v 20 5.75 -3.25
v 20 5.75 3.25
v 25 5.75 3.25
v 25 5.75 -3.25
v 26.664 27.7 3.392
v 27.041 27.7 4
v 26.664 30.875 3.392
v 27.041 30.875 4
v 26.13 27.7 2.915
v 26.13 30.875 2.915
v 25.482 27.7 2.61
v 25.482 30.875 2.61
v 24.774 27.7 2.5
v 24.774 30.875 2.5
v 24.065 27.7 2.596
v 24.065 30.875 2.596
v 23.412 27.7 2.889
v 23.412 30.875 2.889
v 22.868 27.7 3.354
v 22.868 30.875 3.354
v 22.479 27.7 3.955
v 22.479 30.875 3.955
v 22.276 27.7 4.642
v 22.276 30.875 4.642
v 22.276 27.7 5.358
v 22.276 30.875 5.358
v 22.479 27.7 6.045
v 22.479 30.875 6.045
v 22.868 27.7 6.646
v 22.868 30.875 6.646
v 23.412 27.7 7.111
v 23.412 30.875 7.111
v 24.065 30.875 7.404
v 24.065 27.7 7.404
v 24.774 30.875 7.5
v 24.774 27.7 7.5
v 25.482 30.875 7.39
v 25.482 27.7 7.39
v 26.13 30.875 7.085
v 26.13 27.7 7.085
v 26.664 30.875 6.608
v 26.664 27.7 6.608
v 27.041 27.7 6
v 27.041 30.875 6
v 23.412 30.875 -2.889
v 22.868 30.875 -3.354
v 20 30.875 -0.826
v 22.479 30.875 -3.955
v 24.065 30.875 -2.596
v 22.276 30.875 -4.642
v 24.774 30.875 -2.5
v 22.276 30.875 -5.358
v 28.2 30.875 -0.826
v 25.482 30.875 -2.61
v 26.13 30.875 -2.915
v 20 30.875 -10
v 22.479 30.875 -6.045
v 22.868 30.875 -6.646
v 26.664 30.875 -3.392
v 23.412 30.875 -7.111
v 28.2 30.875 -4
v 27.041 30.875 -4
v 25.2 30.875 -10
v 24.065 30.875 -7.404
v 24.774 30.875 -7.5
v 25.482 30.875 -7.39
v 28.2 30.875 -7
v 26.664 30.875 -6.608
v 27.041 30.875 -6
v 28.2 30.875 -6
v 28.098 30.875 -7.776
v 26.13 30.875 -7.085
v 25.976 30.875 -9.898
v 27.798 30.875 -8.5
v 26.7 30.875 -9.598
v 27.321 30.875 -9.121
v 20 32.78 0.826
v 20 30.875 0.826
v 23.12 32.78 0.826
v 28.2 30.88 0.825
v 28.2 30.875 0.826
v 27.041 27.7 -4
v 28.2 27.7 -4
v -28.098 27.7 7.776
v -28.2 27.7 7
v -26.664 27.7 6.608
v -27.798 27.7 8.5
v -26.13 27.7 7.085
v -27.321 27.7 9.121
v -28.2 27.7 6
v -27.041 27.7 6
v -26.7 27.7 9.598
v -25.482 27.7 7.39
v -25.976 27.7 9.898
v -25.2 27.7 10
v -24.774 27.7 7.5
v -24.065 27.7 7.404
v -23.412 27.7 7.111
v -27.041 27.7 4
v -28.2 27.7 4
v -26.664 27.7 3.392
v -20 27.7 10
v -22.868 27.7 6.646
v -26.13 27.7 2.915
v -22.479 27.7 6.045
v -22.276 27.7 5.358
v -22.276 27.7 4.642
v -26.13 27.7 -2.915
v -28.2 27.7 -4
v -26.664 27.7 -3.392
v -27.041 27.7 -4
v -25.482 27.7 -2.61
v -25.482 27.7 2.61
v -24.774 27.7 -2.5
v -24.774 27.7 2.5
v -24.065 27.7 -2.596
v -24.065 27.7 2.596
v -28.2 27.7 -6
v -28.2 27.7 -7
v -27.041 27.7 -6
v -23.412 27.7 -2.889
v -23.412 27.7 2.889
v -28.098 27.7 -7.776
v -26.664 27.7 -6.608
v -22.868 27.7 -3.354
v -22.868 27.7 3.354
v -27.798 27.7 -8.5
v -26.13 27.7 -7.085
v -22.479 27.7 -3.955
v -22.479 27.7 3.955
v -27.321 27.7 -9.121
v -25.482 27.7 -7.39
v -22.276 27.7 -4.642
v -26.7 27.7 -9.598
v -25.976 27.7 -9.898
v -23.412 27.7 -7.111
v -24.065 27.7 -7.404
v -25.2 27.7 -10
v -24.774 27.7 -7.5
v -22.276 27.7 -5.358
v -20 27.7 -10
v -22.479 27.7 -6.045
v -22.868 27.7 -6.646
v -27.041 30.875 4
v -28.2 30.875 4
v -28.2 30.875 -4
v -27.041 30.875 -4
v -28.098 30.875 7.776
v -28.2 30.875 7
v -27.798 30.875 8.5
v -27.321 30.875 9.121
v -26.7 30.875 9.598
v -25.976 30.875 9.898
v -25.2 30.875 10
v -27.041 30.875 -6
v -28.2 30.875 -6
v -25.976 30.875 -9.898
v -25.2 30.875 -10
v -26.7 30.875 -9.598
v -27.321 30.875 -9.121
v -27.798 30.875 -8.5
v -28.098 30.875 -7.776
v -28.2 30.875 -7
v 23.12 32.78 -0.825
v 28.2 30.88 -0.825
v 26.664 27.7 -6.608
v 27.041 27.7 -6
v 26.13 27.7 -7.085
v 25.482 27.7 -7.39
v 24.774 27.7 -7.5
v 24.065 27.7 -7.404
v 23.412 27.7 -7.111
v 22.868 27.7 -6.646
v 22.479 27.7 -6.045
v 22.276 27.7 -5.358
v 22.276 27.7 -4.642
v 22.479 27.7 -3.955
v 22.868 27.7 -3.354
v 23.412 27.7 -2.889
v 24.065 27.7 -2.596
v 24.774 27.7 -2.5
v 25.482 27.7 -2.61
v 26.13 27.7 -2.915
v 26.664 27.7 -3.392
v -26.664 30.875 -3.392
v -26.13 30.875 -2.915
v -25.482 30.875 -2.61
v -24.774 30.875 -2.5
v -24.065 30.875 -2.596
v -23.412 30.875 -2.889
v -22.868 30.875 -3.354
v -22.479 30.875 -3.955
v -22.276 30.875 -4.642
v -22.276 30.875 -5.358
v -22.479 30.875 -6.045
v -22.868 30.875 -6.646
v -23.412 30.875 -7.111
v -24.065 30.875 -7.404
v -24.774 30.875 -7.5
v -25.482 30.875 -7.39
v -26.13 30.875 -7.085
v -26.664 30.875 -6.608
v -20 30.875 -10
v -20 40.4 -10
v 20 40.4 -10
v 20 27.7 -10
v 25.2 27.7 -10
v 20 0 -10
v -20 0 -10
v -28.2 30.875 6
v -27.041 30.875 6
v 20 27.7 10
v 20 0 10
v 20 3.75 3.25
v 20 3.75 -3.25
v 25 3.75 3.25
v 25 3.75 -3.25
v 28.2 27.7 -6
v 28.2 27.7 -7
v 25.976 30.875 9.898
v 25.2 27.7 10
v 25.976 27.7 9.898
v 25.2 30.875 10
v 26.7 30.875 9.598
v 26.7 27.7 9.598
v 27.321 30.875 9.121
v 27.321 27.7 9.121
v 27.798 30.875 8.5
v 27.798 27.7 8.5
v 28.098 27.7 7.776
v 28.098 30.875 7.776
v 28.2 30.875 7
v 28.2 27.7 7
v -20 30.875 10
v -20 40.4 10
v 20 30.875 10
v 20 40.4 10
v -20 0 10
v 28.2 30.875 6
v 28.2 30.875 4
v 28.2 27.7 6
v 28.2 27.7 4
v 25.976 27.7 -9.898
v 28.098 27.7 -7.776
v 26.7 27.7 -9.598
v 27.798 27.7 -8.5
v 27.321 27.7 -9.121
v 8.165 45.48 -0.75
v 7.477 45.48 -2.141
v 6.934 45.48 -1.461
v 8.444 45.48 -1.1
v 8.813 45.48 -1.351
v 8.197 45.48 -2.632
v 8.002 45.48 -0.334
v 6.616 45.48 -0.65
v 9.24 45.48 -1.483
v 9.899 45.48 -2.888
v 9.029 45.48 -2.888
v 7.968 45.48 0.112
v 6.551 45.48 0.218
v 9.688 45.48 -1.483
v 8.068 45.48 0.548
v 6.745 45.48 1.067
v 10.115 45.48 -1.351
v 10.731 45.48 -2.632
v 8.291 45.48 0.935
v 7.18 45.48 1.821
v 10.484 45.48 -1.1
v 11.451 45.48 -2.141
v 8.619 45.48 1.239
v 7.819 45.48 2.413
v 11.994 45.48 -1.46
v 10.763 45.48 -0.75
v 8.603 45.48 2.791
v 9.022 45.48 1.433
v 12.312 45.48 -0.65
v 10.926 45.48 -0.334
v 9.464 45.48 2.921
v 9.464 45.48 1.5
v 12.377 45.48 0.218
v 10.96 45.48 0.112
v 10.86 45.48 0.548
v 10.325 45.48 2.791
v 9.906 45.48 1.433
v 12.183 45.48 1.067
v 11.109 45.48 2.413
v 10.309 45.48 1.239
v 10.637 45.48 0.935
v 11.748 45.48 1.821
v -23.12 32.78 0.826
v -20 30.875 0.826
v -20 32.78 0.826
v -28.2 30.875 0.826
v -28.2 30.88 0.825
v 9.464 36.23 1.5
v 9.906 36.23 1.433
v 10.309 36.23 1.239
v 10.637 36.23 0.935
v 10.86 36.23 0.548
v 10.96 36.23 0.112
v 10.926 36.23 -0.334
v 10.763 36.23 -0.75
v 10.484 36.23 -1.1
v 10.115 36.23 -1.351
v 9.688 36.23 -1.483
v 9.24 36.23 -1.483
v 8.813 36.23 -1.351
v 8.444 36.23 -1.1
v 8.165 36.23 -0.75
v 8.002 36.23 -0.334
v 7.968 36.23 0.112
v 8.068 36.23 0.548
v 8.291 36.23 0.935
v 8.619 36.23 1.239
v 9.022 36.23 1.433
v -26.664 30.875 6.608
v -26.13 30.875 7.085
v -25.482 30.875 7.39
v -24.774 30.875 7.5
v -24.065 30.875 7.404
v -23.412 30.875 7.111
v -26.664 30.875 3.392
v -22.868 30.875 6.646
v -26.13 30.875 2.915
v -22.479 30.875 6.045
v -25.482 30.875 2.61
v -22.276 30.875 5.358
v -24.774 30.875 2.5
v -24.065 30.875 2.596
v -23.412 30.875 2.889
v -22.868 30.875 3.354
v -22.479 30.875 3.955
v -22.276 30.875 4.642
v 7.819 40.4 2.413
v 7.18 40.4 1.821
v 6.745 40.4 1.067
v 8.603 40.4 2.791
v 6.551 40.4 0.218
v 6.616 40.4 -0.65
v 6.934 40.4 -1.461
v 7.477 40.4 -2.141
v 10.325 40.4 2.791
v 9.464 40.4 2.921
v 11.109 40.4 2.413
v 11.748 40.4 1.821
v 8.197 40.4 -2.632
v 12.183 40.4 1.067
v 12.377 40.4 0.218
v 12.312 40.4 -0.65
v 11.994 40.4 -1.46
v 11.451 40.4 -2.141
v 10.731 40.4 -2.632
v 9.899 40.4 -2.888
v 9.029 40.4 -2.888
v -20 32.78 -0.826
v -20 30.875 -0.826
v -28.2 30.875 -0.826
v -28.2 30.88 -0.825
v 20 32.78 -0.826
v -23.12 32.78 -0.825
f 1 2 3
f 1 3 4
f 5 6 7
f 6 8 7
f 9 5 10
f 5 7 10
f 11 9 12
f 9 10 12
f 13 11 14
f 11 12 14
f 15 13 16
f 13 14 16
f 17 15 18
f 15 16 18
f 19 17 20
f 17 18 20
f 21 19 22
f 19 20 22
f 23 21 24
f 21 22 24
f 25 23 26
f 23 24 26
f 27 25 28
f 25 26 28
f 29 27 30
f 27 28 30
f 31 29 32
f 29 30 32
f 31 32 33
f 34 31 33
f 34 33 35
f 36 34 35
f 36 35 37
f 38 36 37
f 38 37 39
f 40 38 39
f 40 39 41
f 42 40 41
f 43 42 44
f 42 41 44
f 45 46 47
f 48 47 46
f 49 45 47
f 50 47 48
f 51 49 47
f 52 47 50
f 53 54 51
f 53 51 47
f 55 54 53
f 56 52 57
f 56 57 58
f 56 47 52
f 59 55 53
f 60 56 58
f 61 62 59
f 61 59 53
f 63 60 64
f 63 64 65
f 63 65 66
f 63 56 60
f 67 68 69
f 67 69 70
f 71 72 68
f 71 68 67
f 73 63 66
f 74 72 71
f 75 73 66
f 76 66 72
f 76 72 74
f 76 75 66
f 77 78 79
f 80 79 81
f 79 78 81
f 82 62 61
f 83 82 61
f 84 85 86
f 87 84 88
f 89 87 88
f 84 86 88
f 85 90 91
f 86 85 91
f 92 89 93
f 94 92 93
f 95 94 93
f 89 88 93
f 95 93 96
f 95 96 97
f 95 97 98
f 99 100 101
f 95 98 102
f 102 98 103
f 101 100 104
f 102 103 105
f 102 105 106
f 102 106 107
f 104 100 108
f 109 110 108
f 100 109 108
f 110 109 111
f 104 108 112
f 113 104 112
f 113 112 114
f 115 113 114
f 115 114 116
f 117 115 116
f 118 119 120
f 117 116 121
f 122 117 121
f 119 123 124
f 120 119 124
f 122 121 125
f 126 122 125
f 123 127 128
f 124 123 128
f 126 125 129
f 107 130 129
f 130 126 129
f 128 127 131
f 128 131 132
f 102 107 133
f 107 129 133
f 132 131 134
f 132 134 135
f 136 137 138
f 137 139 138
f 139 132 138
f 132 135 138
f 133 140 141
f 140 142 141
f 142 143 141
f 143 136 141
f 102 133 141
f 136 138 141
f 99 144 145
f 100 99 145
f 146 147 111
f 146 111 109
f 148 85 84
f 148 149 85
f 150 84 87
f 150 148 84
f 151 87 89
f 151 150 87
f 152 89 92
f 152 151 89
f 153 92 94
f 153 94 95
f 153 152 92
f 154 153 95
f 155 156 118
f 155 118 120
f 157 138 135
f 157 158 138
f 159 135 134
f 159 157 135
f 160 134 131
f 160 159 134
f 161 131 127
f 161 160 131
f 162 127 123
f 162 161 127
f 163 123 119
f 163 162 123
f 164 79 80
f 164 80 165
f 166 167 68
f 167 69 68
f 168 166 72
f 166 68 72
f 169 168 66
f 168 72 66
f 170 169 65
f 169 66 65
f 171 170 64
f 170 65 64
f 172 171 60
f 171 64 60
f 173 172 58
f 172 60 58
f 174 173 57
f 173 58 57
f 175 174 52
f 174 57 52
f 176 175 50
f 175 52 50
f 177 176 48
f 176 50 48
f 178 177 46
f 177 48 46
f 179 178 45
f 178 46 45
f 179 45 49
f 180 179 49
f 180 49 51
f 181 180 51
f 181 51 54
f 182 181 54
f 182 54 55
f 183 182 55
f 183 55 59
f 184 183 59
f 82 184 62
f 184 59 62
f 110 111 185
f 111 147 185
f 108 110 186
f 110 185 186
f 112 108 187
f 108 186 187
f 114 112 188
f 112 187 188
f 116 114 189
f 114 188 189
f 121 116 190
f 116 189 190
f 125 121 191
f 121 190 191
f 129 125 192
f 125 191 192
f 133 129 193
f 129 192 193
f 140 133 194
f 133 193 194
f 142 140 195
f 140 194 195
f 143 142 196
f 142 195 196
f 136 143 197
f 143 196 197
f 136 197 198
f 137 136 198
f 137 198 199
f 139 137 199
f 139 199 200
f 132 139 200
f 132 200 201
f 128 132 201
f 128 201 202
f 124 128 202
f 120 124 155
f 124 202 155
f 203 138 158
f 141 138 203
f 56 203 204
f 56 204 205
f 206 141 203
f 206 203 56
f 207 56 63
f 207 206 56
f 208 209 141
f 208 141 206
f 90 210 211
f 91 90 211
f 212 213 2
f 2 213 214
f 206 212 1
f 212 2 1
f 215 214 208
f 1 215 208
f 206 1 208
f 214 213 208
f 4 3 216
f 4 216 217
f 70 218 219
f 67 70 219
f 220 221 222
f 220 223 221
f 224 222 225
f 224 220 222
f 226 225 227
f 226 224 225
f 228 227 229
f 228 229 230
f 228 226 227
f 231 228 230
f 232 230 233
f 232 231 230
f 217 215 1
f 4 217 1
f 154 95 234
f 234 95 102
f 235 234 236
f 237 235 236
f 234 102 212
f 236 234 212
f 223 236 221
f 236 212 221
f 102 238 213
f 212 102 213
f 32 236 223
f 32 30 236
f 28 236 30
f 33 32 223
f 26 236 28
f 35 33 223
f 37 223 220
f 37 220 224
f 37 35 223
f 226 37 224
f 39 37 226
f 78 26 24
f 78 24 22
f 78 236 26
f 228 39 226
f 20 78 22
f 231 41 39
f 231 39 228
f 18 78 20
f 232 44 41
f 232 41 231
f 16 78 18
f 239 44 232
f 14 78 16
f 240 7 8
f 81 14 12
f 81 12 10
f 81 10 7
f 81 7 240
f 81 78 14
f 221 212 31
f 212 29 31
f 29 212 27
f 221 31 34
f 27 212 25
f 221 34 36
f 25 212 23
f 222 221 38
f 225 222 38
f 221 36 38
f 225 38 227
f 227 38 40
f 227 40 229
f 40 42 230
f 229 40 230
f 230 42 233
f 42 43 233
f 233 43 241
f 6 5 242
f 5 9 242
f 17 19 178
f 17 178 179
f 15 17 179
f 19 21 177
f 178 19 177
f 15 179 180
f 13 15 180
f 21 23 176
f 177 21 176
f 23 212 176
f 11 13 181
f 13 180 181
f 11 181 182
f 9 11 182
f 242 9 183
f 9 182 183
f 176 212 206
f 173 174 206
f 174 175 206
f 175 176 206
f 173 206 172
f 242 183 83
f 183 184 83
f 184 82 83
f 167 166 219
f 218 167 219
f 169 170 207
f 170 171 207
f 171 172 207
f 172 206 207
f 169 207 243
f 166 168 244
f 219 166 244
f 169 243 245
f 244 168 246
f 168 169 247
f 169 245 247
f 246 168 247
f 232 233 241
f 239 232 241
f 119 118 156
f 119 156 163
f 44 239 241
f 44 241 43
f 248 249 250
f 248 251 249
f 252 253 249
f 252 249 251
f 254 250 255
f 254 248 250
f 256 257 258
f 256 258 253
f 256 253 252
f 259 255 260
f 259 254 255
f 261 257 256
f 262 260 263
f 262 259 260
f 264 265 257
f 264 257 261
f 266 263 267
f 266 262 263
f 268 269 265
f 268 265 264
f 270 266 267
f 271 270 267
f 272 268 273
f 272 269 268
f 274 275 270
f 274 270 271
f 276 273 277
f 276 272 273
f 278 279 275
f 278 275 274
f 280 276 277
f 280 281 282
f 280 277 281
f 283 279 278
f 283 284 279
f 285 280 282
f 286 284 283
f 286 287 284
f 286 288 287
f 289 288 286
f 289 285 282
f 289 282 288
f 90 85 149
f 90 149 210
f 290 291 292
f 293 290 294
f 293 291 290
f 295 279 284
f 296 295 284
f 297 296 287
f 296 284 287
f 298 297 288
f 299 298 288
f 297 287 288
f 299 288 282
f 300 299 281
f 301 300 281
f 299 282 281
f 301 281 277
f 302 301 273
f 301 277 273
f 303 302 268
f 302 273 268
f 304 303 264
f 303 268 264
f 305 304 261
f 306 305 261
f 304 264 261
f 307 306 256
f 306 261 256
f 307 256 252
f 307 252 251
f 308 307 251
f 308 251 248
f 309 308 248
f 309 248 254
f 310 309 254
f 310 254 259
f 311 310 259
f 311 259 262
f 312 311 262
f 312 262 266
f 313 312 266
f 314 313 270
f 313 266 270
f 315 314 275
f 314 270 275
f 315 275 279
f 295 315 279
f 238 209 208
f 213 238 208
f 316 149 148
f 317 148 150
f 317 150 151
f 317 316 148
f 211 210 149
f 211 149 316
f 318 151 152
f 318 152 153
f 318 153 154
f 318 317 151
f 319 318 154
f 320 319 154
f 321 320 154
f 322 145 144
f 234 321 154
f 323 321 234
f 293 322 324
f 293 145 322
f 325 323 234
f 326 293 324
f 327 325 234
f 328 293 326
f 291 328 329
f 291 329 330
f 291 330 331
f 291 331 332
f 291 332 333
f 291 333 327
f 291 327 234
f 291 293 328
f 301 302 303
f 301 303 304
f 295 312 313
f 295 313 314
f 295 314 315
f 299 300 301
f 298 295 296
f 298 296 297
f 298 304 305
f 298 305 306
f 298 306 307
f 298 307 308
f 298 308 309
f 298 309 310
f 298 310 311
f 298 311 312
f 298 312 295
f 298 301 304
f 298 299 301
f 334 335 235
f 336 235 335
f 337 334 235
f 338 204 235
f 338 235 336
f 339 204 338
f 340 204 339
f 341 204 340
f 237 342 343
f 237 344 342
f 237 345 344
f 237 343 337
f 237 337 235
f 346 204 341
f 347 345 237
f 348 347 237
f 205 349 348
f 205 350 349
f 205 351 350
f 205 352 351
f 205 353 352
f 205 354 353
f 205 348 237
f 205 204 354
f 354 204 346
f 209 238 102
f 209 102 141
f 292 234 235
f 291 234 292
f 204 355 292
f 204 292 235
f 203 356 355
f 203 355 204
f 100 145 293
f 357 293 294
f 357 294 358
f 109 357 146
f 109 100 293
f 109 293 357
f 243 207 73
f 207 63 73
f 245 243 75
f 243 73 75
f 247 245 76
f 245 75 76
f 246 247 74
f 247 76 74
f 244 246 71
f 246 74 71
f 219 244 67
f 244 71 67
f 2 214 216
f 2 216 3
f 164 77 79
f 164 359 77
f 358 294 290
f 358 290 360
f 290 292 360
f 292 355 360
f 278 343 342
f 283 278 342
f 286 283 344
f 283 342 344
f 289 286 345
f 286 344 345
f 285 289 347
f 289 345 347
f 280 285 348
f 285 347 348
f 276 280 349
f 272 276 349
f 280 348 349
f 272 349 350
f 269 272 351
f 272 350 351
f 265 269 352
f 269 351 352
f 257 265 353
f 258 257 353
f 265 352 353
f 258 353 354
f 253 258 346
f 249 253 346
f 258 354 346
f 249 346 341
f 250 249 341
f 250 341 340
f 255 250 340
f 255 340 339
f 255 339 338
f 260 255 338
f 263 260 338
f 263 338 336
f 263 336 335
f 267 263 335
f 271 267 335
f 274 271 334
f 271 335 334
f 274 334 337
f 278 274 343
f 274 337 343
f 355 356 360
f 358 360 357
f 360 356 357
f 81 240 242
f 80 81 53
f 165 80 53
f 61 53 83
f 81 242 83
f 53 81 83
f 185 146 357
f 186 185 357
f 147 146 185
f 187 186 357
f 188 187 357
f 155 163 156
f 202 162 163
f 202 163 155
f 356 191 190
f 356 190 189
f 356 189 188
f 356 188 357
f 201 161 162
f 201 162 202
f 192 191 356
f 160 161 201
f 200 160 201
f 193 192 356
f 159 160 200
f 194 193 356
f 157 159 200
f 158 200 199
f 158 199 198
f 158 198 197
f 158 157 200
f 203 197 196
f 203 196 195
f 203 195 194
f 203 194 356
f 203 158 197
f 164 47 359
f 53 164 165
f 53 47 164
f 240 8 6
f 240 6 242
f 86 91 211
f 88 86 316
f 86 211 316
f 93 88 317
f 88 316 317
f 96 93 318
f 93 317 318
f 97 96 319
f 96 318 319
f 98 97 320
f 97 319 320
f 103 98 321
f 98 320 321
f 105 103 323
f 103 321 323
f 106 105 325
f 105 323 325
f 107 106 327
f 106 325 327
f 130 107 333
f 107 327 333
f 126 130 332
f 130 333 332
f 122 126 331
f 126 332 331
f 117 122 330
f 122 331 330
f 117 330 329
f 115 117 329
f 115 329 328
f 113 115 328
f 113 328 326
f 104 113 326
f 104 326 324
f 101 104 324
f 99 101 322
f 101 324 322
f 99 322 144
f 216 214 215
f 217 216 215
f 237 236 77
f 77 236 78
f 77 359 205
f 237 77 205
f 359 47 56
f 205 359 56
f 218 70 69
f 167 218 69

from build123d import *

# Parameters (mm, degrees)
SKETCH1_W            = 40
SKETCH1_H            = 20
BOSS_EXTRUDE1_DEPTH  = 40.4
SKETCH2_W            = 56.4
SKETCH2_H            = 20
BOSS_EXTRUDE2_DEPTH  = 3.175
CUT_EXTRUDE1_REACH   = 44.994
SKETCH3_R            = 2.5
CUT_EXTRUDE2_REACH   = 44.994
MIRROR2_COPY_1_REACH = 44.994
FILLET1_R            = 3
SKETCH5_W            = 6.5
SKETCH5_H            = 2
BOSS_EXTRUDE3_DEPTH  = 5
SKETCH6_R            = 2.921
BOSS_EXTRUDE4_DEPTH  = 5.08
SKETCH7_W            = 8.2
SKETCH7_H            = 1.651
BOSS_EXTRUDE5_DEPTH  = 1.905
CHAMFER1_SIZE        = 1.9
CHAMFER1_SIZE2       = 5.08
CHAMFER2_SIZE        = 5.08
CHAMFER2_SIZE2       = 1.9
SKETCH8_R            = 1.5
CUT_EXTRUDE3_DEPTH   = 9.25


with BuildPart() as part:
    # Sketch1 → Boss-Extrude1 (new body)
    with BuildSketch(Plane(origin=(0, 0, 0), x_dir=(1, 0, 0), z_dir=(0, 1, 0))):
        Rectangle(SKETCH1_W, SKETCH1_H)
    extrude(amount=BOSS_EXTRUDE1_DEPTH)

    # Sketch2 → Boss-Extrude2 (add)
    with BuildSketch(Plane(origin=(0, 27.7, 0), x_dir=(1, 0, 0), z_dir=(0, 1, 0))):
        Rectangle(SKETCH2_W, SKETCH2_H)
    extrude(amount=BOSS_EXTRUDE2_DEPTH)

    # Sketch3 → Cut-Extrude1 (cut, up to next)
    with BuildSketch(Plane(origin=(0, 30.875, 0), x_dir=(1, 0, 0), z_dir=(0, 1, 0)), mode=Mode.PRIVATE) as cut_extrude1_sk1:
        with Locations(Location((-24.75, 5, 0), (0, 0, 270))):
            Circle(SKETCH3_R)
    cut_extrude1_tool1 = extrude(cut_extrude1_sk1.sketch, amount=-CUT_EXTRUDE1_REACH, mode=Mode.PRIVATE) & part.part
    # Sketch3 → Cut-Extrude1 (cut, up to next)
    with BuildSketch(Plane(origin=(0, 30.875, 0), x_dir=(1, 0, 0), z_dir=(0, 1, 0)), mode=Mode.PRIVATE) as cut_extrude1_sk2:
        with Locations(Location((-24.75, -5, 0), (0, 0, 270))):
            Circle(SKETCH3_R)
    cut_extrude1_tool2 = extrude(cut_extrude1_sk2.sketch, amount=-CUT_EXTRUDE1_REACH, mode=Mode.PRIVATE) & part.part
    # Sketch3 → Cut-Extrude1 (cut, up to next)
    with BuildSketch(Plane(origin=(0, 30.875, 0), x_dir=(1, 0, 0), z_dir=(0, 1, 0)), mode=Mode.PRIVATE) as cut_extrude1_sk3:
        with Locations(Location((24.75, 5, 0), (0, 0, 270))):
            Circle(SKETCH3_R)
    cut_extrude1_tool3 = extrude(cut_extrude1_sk3.sketch, amount=-CUT_EXTRUDE1_REACH, mode=Mode.PRIVATE) & part.part
    # Sketch3 → Cut-Extrude1 (cut, up to next)
    with BuildSketch(Plane(origin=(0, 30.875, 0), x_dir=(1, 0, 0), z_dir=(0, 1, 0)), mode=Mode.PRIVATE) as cut_extrude1_sk4:
        with Locations(Location((24.75, -5, 0), (0, 0, 270))):
            Circle(SKETCH3_R)
    cut_extrude1_tool4 = extrude(cut_extrude1_sk4.sketch, amount=-CUT_EXTRUDE1_REACH, mode=Mode.PRIVATE) & part.part
    add(cut_extrude1_tool1.solids().sort_by_distance((-24.75, 30.875, -5))[0], mode=Mode.SUBTRACT)
    add(cut_extrude1_tool2.solids().sort_by_distance((-24.75, 30.875, 5))[0], mode=Mode.SUBTRACT)
    add(cut_extrude1_tool3.solids().sort_by_distance((24.75, 30.875, -5))[0], mode=Mode.SUBTRACT)
    add(cut_extrude1_tool4.solids().sort_by_distance((24.75, 30.875, 5))[0], mode=Mode.SUBTRACT)

    # Sketch4 → Cut-Extrude2 (cut, up to next)
    with BuildSketch(Plane(origin=(0, 30.875, 0), x_dir=(1, 0, 0), z_dir=(0, 1, 0)), mode=Mode.PRIVATE) as cut_extrude2_sk1:
        with BuildLine():
            Line((-27.041287847, -4), (-28.2, -4))
            Line((-28.2, -4), (-28.2, -6))
            Line((-28.2, -6), (-27.041287847, -6))
            ThreePointArc((-27.041287847, -6), (-27.25, -5), (-27.041287847, -4))
        make_face()
    cut_extrude2_tool1 = extrude(cut_extrude2_sk1.sketch, amount=-CUT_EXTRUDE2_REACH, mode=Mode.PRIVATE) & part.part
    cut_extrude2 = cut_extrude2_tool1.solids().sort_by_distance((-27.68894, 30.875, 5))[0]
    add(cut_extrude2, mode=Mode.SUBTRACT)

    # Mirror1: Cut-Extrude2 across plane
    add(cut_extrude2.mirror(Plane(origin=(0, 0, 0), x_dir=(0, 0, 1), z_dir=(1, 0, 0))), mode=Mode.SUBTRACT)

    # Mirror2: Cut-Extrude2 across plane
    add(cut_extrude2.mirror(Plane.XY), mode=Mode.SUBTRACT)

    # Mirror2 copy 1 sketch → Mirror2 copy 1 (cut, up to next)
    with BuildSketch(Plane(origin=(0, 30.875, 0), x_dir=(-1, 0, 0), z_dir=(0, 1, 0)), mode=Mode.PRIVATE) as mirror2_copy_1_sk1:
        with BuildLine():
            Line((-27.041287847, -4), (-28.2, -4))
            Line((-28.2, -4), (-28.2, -6))
            Line((-28.2, -6), (-27.041287847, -6))
            ThreePointArc((-27.041287847, -6), (-27.25, -5), (-27.041287847, -4))
        make_face()
    mirror2_copy_1_tool1 = extrude(mirror2_copy_1_sk1.sketch, amount=-MIRROR2_COPY_1_REACH, mode=Mode.PRIVATE) & part.part
    add(mirror2_copy_1_tool1.solids().sort_by_distance((27.68894, 30.875, -5))[0], mode=Mode.SUBTRACT)

    # Fillet1
    fillet1_edges = [part.edges().sort_by_distance(p)[0] for p in [
        (28.2, 29.2875, -10),
        (-28.2, 29.2875, 10),
        (28.2, 29.2875, 10),
        (-28.2, 29.2875, -10),
    ]]
    fillet(fillet1_edges, radius=FILLET1_R)

    # Sketch5 → Boss-Extrude3 (add)
    with BuildSketch(Plane(origin=(20, 0, 0), x_dir=(0, 0, -1), z_dir=(1, 0, 0))):
        with Locations((0, 4.75)):
            Rectangle(SKETCH5_W, SKETCH5_H)
    extrude(amount=BOSS_EXTRUDE3_DEPTH)

    # Sketch6 → Boss-Extrude4 (add)
    with BuildSketch(Plane(origin=(0, 40.4, 0), x_dir=(1, 0, 0), z_dir=(0, 1, 0))):
        with Locations(Location((9.464, 0, 0), (0, 0, 270))):
            Circle(SKETCH6_R)
    extrude(amount=BOSS_EXTRUDE4_DEPTH)

    # Sketch7 → Boss-Extrude5 (add)
    with BuildSketch(Plane(origin=(0, 30.875, 0), x_dir=(1, 0, 0), z_dir=(0, 1, 0))):
        with Locations((24.1, 0)):
            Rectangle(SKETCH7_W, SKETCH7_H)
    boss_extrude5 = extrude(amount=BOSS_EXTRUDE5_DEPTH)

    # Chamfer1
    chamfer1_edges = [part.edges().sort_by_distance(p)[0] for p in [
        (28.2, 32.78, 0),
    ]]
    chamfer1_side = [part.faces().sort_by_distance(p)[0] for p in [
        (28.2, 29.567361633, 0),
    ]]
    chamfer(chamfer1_edges, length=CHAMFER1_SIZE, length2=CHAMFER1_SIZE2, reference=chamfer1_side[0])

    # Mirror3: Boss-Extrude5 across plane
    add(boss_extrude5.mirror(Plane(origin=(0, 0, 0), x_dir=(0, 0, 1), z_dir=(1, 0, 0))))

    # Chamfer2
    chamfer2_edges = [part.edges().sort_by_distance(p)[0] for p in [
        (-28.2, 32.78, 0),
    ]]
    chamfer2_side = [part.faces().sort_by_distance(p)[0] for p in [
        (-24.1, 32.78, 0),
    ]]
    chamfer(chamfer2_edges, length=CHAMFER2_SIZE, length2=CHAMFER2_SIZE2, reference=chamfer2_side[0])

    # Sketch8 → Cut-Extrude3 (cut)
    with BuildSketch(Plane(origin=(0, 45.48, 0), x_dir=(1, 0, 0), z_dir=(0, 1, 0))):
        with Locations(Location((9.464, 0, 0), (0, 0, 270))):
            Circle(SKETCH8_R)
    extrude(amount=-CUT_EXTRUDE3_DEPTH, mode=Mode.SUBTRACT)


solid = part.part
